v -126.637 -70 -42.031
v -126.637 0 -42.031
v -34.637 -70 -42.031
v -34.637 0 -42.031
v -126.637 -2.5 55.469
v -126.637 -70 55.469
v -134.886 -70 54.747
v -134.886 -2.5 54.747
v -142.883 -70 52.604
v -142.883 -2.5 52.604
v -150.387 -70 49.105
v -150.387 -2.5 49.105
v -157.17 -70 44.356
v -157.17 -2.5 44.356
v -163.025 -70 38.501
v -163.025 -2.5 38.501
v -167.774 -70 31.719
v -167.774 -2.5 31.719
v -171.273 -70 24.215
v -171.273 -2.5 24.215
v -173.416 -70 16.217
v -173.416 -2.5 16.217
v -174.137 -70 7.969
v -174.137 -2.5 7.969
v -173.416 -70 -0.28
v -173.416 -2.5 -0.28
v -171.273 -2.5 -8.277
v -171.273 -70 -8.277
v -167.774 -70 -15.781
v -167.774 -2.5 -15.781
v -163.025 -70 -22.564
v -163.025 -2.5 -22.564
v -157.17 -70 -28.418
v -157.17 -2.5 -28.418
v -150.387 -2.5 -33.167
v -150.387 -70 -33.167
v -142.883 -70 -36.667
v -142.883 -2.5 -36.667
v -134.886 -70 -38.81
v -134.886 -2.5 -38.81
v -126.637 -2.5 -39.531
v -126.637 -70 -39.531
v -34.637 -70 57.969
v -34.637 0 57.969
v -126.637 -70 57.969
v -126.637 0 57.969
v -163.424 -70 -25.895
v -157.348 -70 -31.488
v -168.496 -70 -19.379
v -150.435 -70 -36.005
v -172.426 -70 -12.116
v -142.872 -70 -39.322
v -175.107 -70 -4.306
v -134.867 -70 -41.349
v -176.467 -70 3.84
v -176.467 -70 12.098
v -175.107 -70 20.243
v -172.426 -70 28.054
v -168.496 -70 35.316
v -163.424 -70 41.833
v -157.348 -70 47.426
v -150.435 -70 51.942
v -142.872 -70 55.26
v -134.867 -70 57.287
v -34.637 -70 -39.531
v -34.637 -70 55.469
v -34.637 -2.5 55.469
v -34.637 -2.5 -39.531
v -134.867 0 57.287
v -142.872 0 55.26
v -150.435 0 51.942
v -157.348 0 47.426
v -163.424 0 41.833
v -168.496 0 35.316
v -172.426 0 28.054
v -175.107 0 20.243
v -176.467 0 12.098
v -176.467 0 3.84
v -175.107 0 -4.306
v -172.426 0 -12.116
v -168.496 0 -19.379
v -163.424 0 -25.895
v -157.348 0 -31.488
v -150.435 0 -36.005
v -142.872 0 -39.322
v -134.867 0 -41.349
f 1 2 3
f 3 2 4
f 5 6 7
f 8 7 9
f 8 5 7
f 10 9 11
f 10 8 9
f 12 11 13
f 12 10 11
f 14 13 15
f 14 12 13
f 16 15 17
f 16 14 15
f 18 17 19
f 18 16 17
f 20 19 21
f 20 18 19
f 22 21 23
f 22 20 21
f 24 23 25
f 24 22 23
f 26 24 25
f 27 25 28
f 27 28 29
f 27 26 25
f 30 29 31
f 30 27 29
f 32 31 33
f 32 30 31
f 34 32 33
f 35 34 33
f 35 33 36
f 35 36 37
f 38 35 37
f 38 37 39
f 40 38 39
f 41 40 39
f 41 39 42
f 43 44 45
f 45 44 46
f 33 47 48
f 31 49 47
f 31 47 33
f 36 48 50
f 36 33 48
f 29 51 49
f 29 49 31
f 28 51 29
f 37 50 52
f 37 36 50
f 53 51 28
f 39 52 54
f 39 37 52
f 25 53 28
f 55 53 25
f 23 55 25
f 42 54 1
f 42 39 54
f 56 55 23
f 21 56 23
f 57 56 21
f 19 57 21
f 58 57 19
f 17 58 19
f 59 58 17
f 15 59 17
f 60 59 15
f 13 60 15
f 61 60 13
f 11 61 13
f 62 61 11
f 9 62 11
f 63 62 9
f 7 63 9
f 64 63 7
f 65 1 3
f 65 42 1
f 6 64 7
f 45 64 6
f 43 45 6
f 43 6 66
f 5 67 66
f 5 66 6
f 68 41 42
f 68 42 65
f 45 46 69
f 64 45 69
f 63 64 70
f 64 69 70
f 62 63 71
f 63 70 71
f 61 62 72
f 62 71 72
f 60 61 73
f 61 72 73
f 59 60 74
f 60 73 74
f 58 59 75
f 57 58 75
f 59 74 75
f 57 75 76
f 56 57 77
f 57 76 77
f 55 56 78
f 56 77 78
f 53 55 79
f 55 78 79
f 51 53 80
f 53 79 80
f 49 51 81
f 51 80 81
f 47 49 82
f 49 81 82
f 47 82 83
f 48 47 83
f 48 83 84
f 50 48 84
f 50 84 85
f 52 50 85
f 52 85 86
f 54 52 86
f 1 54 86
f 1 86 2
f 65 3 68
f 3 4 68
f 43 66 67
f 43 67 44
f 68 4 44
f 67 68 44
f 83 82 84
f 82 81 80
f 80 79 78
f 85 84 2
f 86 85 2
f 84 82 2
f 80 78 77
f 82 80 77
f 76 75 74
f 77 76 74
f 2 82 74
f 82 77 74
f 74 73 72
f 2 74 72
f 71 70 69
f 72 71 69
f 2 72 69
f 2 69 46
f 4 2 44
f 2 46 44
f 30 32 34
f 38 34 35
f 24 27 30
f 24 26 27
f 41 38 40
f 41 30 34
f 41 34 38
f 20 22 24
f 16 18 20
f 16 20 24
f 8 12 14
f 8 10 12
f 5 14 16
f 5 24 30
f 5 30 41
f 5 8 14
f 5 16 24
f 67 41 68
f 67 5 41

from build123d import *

# Parameters (mm, degrees)
F1_DEPTH = 70
F2_T     = -2.5


with BuildPart() as f1:
    # F0 (on Front) → F1 (new body)
    with BuildSketch(Plane.XZ):
        with BuildLine():
            Line((-34.637429, 57.968741), (-126.637429, 57.968741))
            ThreePointArc((-126.637429, 57.968741), (-176.637429, 7.968741), (-126.637429, -42.031259))
            Line((-126.637429, -42.031259), (-34.637429, -42.031259))
            Line((-34.637429, -42.031259), (-34.637429, 57.968741))
        make_face()
    extrude(amount=F1_DEPTH)

    # F2
    f2_openings = [f1.faces().sort_by_distance(p)[0] for p in [
        (-34.637429, -35, 7.968741),
        (-100.746753, -70, 7.968741),
    ]]
    offset(amount=F2_T, openings=f2_openings)


solid = f1.part
